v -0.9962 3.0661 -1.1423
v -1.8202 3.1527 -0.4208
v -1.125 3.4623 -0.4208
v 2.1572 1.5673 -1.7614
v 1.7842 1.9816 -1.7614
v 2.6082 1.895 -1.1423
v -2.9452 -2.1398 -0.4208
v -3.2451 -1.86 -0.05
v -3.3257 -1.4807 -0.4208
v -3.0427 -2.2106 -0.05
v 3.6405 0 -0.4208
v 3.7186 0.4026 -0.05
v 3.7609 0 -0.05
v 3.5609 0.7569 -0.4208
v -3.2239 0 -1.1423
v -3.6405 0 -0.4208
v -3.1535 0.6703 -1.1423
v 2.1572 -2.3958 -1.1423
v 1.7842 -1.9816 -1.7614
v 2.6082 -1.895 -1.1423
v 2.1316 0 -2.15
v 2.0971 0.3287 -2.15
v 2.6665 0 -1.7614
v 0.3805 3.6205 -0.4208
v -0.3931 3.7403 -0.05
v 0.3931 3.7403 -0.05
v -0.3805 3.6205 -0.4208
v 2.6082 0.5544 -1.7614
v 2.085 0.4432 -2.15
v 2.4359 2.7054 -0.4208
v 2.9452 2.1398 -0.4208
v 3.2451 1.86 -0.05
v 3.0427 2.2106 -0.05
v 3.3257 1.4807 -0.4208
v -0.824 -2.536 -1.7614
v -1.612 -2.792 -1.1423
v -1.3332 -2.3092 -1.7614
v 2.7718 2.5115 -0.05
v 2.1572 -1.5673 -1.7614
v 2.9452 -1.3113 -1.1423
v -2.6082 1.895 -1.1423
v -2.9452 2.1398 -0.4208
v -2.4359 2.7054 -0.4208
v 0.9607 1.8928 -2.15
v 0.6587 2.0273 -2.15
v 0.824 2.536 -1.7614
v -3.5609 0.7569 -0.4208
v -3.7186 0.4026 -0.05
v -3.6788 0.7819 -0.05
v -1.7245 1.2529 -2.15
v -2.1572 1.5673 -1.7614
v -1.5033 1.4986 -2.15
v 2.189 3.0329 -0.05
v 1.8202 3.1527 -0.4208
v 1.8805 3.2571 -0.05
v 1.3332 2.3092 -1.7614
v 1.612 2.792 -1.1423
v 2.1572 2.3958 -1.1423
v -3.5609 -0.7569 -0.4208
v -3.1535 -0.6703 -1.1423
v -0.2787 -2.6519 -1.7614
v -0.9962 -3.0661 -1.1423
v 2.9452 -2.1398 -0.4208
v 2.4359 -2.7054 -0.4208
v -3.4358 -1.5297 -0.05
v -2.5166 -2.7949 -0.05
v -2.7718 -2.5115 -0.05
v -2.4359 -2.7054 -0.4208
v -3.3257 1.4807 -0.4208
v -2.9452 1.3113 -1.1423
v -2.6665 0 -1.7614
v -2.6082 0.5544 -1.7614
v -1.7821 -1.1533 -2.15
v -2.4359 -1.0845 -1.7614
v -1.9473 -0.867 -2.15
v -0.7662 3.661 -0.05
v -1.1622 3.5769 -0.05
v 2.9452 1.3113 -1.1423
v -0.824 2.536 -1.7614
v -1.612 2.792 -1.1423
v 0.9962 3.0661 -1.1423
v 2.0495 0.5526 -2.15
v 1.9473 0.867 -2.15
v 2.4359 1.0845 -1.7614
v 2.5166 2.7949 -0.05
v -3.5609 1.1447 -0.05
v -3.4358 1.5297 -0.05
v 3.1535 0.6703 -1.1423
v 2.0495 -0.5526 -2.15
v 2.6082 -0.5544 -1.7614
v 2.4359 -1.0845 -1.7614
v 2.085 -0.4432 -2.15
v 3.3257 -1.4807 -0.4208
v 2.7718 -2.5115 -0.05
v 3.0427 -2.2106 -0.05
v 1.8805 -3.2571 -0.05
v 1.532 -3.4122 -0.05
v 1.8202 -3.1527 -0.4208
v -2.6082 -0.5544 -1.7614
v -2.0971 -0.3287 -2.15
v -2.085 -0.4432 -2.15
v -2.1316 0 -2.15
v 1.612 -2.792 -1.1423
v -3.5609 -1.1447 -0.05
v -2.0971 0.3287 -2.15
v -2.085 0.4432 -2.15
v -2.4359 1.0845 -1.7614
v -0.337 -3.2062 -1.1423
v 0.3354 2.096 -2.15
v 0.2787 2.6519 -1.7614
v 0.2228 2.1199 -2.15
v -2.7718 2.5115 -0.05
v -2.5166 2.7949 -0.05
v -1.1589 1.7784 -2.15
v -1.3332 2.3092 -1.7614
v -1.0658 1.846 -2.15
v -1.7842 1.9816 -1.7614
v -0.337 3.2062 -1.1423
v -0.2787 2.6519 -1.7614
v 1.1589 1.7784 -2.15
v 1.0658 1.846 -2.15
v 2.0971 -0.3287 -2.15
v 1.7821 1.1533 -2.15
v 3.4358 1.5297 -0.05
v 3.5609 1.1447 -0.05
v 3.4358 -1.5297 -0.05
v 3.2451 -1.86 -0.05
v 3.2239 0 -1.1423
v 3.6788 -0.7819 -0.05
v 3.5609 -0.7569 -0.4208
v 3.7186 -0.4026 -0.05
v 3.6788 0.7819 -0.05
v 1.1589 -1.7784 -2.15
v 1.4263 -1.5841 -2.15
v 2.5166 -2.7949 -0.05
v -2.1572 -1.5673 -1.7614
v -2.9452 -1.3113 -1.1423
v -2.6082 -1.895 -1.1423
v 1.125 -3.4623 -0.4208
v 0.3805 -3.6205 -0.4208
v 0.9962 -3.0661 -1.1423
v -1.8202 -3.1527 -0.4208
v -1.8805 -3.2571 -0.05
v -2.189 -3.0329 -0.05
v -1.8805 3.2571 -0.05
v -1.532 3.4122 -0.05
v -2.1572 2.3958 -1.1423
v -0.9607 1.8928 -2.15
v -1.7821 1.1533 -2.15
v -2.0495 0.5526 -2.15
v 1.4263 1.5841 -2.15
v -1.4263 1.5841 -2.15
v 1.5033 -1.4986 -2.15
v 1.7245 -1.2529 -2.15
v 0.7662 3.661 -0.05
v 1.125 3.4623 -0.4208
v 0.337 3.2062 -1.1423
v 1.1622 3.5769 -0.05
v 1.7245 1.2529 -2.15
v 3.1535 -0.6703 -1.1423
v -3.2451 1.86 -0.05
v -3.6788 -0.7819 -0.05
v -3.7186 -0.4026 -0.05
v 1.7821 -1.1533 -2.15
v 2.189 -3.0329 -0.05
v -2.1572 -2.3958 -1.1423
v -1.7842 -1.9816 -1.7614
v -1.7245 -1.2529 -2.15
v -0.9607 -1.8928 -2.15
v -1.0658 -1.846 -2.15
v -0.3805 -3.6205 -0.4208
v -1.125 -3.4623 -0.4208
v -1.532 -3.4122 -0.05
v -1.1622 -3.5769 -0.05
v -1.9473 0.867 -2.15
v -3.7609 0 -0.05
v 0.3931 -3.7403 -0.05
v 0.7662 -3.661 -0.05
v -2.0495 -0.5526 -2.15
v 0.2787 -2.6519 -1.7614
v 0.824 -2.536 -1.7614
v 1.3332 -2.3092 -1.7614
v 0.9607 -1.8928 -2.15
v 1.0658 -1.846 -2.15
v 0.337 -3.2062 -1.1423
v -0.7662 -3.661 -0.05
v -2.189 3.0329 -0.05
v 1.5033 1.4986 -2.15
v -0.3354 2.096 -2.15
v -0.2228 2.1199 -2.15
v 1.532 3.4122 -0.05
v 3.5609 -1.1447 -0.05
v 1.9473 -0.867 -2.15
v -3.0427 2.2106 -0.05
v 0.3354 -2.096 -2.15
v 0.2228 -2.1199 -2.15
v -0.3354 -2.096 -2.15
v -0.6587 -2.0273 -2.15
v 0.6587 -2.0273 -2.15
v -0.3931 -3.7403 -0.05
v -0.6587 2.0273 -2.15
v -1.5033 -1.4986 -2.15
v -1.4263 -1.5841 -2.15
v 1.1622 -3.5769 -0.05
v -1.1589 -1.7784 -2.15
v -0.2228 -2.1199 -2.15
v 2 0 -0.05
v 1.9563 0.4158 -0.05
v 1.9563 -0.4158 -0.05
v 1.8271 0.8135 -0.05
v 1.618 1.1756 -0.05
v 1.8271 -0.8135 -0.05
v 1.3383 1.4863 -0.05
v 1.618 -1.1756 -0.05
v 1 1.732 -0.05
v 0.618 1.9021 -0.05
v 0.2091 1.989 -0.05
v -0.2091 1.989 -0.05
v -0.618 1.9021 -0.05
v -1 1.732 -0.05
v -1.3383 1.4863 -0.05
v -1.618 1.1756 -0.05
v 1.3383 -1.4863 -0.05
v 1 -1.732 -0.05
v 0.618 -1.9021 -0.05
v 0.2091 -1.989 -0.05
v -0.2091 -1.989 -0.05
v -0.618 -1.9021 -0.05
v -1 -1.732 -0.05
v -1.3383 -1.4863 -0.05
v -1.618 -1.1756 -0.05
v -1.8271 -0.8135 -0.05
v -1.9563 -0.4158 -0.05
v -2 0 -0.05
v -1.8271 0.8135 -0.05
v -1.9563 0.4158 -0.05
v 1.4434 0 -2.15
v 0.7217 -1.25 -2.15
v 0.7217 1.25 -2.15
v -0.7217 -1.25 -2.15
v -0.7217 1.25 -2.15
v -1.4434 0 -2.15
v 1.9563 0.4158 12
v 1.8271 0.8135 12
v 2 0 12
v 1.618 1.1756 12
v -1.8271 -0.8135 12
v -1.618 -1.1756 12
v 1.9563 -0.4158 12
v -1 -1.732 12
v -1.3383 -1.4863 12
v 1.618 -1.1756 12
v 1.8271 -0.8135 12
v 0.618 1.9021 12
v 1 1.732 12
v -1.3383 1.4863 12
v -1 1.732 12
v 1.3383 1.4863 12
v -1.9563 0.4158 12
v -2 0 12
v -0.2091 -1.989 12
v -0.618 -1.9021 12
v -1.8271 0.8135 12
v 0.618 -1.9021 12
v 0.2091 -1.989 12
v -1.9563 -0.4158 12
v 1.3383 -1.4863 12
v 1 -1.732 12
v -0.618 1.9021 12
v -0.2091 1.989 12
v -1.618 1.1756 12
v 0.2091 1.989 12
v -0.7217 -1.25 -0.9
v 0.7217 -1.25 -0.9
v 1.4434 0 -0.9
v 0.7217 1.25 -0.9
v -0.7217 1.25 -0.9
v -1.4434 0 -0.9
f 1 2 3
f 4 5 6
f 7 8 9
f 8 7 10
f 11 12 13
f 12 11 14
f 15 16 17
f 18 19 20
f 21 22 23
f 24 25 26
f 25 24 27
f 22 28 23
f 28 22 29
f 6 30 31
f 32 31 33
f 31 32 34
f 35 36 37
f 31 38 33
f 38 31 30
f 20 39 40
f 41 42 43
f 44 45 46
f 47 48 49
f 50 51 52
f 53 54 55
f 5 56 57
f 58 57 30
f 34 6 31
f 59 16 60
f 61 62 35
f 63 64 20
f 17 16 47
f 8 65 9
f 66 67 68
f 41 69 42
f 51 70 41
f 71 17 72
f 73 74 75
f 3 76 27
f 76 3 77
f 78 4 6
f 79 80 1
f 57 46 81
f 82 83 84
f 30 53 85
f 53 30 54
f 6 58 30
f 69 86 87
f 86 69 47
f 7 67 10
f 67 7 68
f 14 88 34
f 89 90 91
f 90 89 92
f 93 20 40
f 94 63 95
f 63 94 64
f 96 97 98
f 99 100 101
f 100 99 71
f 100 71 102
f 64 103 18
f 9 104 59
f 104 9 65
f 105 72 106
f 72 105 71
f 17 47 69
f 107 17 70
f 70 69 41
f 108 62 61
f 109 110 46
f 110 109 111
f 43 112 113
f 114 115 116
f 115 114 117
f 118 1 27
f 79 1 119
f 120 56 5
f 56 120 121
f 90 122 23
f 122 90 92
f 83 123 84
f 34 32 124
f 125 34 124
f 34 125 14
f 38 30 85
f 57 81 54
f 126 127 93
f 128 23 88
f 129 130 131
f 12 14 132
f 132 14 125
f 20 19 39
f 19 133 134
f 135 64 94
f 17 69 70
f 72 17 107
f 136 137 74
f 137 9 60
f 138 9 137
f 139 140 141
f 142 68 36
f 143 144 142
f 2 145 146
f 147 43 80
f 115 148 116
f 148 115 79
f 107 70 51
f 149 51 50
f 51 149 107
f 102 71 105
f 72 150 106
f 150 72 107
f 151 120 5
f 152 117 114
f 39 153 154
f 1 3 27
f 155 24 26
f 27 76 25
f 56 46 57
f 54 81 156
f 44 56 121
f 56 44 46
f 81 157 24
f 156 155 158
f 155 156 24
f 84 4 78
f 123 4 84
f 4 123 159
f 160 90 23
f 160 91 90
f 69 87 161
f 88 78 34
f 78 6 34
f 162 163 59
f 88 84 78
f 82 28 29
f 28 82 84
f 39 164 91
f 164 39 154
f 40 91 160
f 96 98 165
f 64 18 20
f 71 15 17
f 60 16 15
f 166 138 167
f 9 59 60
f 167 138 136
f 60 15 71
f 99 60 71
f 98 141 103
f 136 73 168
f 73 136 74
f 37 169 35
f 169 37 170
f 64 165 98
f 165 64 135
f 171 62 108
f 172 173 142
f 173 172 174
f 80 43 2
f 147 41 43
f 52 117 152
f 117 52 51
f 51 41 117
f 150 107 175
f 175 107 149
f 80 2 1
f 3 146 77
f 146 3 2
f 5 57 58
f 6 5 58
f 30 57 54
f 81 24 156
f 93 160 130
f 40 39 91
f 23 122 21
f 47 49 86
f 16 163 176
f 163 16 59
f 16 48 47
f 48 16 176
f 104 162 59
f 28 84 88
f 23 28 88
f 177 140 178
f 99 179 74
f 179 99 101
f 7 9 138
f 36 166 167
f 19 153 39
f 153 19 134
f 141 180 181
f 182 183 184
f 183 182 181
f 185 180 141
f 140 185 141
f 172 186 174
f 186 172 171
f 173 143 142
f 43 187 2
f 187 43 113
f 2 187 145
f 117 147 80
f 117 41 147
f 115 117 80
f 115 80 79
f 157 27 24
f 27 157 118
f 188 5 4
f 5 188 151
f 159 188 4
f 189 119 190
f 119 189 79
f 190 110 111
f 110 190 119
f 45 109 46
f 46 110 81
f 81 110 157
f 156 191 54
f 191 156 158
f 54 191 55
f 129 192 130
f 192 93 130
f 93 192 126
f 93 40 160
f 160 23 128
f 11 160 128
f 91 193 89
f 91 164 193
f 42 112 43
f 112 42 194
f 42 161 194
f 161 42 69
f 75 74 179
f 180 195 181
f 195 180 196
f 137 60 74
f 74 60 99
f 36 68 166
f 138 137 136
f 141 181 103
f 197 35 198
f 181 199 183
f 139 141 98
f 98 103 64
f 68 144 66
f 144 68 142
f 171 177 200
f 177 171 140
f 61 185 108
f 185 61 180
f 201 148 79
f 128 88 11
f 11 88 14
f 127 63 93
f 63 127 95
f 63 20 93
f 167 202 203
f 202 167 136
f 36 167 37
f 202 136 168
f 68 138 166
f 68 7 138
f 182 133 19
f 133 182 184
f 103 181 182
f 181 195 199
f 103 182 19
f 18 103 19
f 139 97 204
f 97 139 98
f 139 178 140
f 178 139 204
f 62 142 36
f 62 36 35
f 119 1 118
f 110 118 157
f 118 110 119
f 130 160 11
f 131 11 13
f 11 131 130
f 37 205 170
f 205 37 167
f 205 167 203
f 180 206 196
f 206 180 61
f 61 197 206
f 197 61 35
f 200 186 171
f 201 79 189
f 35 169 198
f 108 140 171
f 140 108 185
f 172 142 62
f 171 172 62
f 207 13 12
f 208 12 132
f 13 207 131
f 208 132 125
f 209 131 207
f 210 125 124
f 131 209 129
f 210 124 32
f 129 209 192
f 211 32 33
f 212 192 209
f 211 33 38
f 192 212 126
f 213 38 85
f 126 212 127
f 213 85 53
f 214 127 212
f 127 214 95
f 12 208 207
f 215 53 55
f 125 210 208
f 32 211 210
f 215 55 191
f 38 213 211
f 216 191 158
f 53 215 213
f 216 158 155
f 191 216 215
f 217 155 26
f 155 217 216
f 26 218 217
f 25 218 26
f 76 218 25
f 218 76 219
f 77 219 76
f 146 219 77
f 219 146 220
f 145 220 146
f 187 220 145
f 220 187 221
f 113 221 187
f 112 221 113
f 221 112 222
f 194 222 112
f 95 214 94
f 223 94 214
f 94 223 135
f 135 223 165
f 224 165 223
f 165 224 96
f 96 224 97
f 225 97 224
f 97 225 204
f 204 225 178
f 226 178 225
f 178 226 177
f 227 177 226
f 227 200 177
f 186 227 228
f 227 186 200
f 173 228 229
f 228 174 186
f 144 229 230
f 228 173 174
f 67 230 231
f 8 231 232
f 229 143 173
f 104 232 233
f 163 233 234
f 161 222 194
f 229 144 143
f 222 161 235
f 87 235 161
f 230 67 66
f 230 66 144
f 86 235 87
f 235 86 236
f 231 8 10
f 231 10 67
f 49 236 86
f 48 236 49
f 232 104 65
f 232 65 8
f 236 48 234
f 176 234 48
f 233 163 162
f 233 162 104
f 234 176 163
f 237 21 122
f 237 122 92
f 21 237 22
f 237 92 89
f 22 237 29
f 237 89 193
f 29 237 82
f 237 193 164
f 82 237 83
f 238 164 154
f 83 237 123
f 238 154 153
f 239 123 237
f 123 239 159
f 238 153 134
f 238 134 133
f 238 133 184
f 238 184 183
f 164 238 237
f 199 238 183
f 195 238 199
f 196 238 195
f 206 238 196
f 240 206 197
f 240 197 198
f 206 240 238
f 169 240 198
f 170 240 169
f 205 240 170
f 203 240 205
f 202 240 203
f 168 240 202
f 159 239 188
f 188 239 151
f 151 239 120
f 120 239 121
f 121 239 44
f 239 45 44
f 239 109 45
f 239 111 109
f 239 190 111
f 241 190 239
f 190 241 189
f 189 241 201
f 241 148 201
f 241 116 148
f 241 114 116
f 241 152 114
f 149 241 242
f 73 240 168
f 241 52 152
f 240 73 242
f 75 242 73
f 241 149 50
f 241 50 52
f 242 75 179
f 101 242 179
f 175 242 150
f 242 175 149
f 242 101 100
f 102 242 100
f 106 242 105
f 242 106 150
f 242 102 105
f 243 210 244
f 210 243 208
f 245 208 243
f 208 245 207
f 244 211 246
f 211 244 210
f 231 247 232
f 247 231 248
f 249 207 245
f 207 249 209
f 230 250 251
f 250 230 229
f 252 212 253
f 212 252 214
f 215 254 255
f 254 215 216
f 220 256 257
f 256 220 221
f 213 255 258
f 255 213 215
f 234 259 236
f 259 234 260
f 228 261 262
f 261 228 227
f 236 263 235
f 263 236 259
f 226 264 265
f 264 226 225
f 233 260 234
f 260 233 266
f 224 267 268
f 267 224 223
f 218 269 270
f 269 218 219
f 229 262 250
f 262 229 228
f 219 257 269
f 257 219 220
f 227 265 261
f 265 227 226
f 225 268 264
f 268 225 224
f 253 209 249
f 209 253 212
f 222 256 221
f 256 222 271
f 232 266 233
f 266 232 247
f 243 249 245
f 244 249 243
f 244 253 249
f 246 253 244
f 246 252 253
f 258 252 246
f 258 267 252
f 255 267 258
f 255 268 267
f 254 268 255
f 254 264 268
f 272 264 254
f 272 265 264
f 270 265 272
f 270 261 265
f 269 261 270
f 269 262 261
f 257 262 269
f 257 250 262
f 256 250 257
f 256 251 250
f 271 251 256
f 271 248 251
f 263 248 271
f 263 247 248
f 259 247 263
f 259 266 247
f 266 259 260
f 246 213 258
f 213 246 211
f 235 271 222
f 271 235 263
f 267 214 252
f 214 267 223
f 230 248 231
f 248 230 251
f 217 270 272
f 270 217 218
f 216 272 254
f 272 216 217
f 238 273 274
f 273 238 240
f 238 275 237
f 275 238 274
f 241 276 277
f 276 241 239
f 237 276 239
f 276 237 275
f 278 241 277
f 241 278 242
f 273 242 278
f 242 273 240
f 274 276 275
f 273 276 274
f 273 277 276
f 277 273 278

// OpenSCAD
/*
   Copyright 2018 Scott Bezek and the splitflap contributors

   Licensed under the Apache License, Version 2.0 (the "License");
   you may not use this file except in compliance with the License.
   You may obtain a copy of the License at

       http://www.apache.org/licenses/LICENSE-2.0

   Unless required by applicable law or agreed to in writing, software
   distributed under the License is distributed on an "AS IS" BASIS,
   WITHOUT WARRANTIES OR CONDITIONS OF ANY KIND, either express or implied.
   See the License for the specific language governing permissions and
   limitations under the License.
*/

module roughM4_7380(length) {
    eps = 0.1;
    thread_diameter = 4;
    head_diameter = 7.6;
    head_length = 2.2;
    driving_depth = 1.3;
    driving_apothem = 2.5/2;
    driving_radius = driving_apothem / cos(180/6);

    sphere_offset = 1.2;  // Just a guess
    sphere_radius = sqrt(sphere_offset*sphere_offset + (head_diameter/2)*(head_diameter/2));

    color([0.75, 0.75, 0.8]) {
        difference() {
            union() {
                translate([0, 0, -eps]) {
                    cylinder(h=length+eps, d=thread_diameter, $fn=30);
                }
                difference() {
                    translate([0, 0, sphere_offset]) {
                        sphere(sphere_radius, $fn=30);
                    }
                    translate([0, 0, sphere_radius]) {
                        cube([sphere_radius*2 + eps, sphere_radius*2 + eps, sphere_radius*2 + eps], center=true);
                    }
                    translate([0, 0, -sphere_radius - head_length]) {
                        cube([sphere_radius*2 + eps, sphere_radius*2 + eps, sphere_radius*2 + eps], center=true);
                    }
                }
            }
            translate([0, 0, -head_length-eps]) {
                cylinder(h=driving_depth+eps, r=driving_radius, $fn=6);
            }
        }
    }
}

roughM4_7380(12);
